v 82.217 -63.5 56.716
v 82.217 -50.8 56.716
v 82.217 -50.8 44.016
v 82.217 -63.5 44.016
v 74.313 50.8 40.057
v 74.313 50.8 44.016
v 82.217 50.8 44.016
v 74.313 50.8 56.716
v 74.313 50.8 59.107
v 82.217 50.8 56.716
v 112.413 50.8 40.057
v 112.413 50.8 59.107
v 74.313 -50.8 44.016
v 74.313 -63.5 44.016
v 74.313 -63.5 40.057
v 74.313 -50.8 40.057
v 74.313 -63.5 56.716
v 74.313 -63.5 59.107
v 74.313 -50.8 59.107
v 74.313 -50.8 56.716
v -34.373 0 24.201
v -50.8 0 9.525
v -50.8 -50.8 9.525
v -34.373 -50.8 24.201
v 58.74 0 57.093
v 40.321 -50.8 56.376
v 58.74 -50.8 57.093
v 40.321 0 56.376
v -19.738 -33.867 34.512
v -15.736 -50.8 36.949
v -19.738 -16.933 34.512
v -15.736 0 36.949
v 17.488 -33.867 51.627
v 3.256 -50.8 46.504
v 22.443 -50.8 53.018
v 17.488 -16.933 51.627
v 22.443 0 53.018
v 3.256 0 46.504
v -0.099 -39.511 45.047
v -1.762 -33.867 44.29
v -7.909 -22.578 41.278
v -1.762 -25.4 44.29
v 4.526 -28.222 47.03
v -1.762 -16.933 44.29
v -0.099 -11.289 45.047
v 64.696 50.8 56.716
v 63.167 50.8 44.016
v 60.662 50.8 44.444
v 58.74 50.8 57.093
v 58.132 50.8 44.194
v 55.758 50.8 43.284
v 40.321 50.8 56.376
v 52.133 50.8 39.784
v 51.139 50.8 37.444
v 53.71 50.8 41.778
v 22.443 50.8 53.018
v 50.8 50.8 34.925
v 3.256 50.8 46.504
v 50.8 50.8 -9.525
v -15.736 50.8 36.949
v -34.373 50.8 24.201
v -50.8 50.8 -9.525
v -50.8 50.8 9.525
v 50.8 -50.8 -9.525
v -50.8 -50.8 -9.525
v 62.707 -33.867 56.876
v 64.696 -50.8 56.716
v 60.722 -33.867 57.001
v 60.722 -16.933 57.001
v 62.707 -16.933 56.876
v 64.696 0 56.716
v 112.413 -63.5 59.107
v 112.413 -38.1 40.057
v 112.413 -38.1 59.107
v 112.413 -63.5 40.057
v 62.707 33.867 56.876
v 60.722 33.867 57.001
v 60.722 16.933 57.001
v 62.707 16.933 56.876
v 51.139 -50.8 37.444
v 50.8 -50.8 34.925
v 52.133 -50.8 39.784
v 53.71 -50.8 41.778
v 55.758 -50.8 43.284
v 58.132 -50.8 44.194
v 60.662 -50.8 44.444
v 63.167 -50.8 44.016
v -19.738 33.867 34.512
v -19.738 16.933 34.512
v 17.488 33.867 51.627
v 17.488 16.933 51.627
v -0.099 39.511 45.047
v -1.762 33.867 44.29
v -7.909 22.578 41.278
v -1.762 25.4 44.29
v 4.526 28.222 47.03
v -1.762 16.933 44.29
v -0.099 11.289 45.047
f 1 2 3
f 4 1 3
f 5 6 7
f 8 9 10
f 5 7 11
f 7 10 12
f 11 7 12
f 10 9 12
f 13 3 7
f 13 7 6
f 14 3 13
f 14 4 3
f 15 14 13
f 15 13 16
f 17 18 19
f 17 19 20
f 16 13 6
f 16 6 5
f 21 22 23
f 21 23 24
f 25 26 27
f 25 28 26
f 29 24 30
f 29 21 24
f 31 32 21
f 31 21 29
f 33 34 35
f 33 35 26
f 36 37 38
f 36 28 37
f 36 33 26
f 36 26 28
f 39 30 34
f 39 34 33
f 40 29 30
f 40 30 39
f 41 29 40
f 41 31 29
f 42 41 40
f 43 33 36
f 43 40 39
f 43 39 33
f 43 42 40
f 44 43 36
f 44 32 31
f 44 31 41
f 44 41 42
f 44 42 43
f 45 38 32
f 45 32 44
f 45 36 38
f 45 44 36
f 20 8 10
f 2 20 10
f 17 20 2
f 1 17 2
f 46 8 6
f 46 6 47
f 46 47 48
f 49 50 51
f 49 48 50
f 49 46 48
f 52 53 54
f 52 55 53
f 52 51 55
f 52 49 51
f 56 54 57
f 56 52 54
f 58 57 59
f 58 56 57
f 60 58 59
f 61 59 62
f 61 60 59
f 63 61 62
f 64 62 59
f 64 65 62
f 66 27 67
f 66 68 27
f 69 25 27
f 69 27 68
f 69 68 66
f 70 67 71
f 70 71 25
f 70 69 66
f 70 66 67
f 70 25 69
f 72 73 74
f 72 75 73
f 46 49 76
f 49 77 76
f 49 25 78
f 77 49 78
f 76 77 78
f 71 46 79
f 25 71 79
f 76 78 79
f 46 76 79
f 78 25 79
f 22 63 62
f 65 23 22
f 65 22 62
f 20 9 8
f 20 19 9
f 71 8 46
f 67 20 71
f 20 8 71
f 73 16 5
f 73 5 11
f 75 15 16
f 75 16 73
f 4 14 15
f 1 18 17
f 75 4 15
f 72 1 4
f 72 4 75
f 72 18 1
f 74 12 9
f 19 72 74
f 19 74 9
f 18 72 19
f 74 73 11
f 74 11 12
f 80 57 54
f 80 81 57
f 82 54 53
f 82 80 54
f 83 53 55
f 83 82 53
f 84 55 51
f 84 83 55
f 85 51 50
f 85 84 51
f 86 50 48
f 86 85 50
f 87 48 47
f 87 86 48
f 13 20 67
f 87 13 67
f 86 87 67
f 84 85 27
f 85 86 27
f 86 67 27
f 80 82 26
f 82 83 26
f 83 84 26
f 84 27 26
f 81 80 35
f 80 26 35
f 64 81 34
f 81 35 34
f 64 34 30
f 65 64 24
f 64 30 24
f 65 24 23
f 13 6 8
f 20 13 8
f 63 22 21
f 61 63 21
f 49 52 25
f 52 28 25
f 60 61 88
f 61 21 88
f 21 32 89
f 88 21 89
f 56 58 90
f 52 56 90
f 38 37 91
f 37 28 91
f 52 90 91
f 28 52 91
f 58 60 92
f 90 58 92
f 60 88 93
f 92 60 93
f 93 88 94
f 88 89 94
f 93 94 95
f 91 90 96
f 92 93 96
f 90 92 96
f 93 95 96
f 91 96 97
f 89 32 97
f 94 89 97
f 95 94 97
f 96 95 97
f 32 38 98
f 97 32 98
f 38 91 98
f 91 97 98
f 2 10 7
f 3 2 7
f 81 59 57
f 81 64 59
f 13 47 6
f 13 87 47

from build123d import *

# Parameters (mm, degrees)
F1_DEPTH = 50.8
F2_DEPTH = 12.7


with BuildPart() as f1:
    # F0 (on Front) → F1 (new body, symmetric)
    with BuildSketch(Plane.XZ):
        with BuildLine():
            add(Edge.make_bspline(
                [(-50.8, 9.525), (-23.533797, 37.189879), (16.188515, 58.709513), (58.740117, 57.093418)],
                knots=[0, 0, 0, 0, 119.218988, 119.218988, 119.218988, 119.218988], degree=3))
            Line((-50.8, 9.525), (38.1, 9.525))
            Line((38.1, 9.525), (38.1, 34.925))
            ThreePointArc((38.1, 34.925), (44.058859, 50.069745), (58.740117, 57.093418))
        make_face()
        Polygon((-50.8, 9.525), (-50.8, -9.525), (50.8, -9.525), (50.8, 9.525), (38.1, 9.525), align=None)
        with BuildLine():
            Line((38.1, 9.525), (50.8, 9.525))
            Line((50.8, 9.525), (50.8, 34.925))
            ThreePointArc((50.8, 34.925), (54.683589, 42.599641), (63.167477, 44.015982))
            Line((63.167477, 44.015982), (74.313026, 44.015982))
            Line((74.313026, 44.015982), (74.313026, 56.715982))
            Line((74.313026, 56.715982), (64.695783, 56.715982))
            add(Edge.make_bspline(
                [(58.740117, 57.093418), (60.719539, 57.018241), (62.705084, 56.892998), (64.695783, 56.715982)],
                knots=[119.218988, 119.218988, 119.218988, 119.218988, 124.764837, 124.764837, 124.764837, 124.764837], degree=3))
            ThreePointArc((58.740117, 57.093418), (44.058859, 50.069745), (38.1, 34.925))
            Line((38.1, 34.925), (38.1, 9.525))
        make_face()
        Polygon((74.313026, 59.106587), (74.313026, 56.715982), (82.217477, 56.715982), (82.217477, 44.015982), (74.313026, 44.015982), (74.313026, 40.056587), (112.413026, 40.056587), (112.413026, 59.106587), align=None)
    extrude(amount=F1_DEPTH, both=True)

    # F1_face (on face) → F2 (join, symmetric)
    with BuildSketch(Plane(origin=(95.786385, -50.8, 49.455683), x_dir=(1, 0, 0), z_dir=(0, -1, 0))):
        Polygon((16.626642, 9.650904), (-21.473358, 9.650904), (-21.473358, 7.260299), (-13.568907, 7.260299), (-13.568907, -5.439701), (-21.473358, -5.439701), (-21.473358, -9.399096), (16.626642, -9.399096), align=None)
    extrude(amount=F2_DEPTH, both=True)


solid = f1.part
